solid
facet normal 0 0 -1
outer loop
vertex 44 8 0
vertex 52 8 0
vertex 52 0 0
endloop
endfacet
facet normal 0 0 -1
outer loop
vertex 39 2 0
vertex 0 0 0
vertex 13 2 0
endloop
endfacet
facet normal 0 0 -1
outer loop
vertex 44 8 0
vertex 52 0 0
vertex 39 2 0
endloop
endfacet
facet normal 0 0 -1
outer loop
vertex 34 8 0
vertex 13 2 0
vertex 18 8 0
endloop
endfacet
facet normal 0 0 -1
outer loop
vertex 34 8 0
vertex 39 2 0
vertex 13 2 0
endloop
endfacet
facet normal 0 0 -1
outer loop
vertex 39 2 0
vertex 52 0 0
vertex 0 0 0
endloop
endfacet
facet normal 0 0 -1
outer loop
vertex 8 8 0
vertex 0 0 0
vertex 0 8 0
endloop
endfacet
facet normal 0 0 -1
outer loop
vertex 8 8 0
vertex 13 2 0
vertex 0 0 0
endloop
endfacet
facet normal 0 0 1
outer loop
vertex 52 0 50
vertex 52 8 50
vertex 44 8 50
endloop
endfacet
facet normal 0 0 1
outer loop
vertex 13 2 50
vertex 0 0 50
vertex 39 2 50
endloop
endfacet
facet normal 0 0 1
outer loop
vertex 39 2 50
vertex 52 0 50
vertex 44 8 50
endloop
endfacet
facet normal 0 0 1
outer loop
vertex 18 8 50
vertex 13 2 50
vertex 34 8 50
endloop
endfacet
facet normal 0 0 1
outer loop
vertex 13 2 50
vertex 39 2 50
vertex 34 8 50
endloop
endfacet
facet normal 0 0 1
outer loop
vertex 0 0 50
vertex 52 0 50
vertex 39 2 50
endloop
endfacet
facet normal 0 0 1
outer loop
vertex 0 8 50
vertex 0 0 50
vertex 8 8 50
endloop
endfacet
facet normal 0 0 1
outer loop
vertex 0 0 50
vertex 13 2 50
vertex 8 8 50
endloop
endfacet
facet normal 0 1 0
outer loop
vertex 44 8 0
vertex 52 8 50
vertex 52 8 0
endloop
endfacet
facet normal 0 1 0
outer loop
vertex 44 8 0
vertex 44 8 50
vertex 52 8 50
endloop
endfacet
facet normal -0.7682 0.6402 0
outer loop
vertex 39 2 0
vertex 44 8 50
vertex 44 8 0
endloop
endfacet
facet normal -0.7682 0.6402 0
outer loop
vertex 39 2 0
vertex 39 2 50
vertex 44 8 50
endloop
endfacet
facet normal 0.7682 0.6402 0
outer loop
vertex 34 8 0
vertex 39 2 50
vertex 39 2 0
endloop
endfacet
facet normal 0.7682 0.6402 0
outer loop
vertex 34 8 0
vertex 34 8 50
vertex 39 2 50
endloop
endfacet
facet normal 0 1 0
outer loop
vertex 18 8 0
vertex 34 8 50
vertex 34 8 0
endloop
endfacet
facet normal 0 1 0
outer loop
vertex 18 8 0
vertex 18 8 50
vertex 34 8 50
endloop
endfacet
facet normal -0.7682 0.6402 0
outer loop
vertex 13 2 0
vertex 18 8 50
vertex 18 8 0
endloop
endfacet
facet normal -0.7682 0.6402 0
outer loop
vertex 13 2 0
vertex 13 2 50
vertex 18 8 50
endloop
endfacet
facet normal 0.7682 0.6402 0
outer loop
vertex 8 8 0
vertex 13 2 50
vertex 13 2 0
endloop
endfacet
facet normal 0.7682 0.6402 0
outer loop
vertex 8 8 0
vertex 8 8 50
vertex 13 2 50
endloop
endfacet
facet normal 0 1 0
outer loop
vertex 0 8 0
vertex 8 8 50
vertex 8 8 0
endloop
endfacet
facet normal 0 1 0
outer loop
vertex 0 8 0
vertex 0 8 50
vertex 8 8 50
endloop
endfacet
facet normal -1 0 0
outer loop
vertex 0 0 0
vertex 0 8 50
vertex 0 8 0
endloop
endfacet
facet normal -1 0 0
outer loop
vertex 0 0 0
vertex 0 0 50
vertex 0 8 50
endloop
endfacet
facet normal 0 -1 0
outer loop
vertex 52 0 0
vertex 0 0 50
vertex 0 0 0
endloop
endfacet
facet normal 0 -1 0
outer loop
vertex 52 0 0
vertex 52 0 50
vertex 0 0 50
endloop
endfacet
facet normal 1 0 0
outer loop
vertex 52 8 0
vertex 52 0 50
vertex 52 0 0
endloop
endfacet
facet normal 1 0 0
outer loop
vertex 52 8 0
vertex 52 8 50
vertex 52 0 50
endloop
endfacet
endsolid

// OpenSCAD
$fn = 32;

// ----------------------------------------------------------------------
// V guide rail: doublev, 52 mm wide
// ----------------------------------------------------------------------

// --- parameters (mm) ---
rail_w = 52;              // rail width, X
base_t = 8;               // base plate thickness
v_depth = 6;              // V feature depth / height
v_half_w = 10;            // half width of the V at the base face
plate_t = 50;             // rail length, Z (the extrusion height)
groove_off = 13;          // offset of each groove from the centreline
fit_tol = 0.1;            // declared fit tolerance (prompt contract)
free_tol = 0.5;           // declared free tolerance (prompt contract)

centre_x = rail_w / 2;  // rail centreline
groove_a = centre_x - groove_off;  // axis of the first groove
groove_b = centre_x + groove_off;  // axis of the second groove

profile = [[0, 0], [52, 0], [52, 8], [44, 8], [39, 2], [34, 8], [18, 8], [13, 2], [8, 8], [0, 8]];  // primary outline, 10 points, counter clockwise

// --- the one profile operation ---
linear_extrude(height = plate_t) polygon(points = profile);
